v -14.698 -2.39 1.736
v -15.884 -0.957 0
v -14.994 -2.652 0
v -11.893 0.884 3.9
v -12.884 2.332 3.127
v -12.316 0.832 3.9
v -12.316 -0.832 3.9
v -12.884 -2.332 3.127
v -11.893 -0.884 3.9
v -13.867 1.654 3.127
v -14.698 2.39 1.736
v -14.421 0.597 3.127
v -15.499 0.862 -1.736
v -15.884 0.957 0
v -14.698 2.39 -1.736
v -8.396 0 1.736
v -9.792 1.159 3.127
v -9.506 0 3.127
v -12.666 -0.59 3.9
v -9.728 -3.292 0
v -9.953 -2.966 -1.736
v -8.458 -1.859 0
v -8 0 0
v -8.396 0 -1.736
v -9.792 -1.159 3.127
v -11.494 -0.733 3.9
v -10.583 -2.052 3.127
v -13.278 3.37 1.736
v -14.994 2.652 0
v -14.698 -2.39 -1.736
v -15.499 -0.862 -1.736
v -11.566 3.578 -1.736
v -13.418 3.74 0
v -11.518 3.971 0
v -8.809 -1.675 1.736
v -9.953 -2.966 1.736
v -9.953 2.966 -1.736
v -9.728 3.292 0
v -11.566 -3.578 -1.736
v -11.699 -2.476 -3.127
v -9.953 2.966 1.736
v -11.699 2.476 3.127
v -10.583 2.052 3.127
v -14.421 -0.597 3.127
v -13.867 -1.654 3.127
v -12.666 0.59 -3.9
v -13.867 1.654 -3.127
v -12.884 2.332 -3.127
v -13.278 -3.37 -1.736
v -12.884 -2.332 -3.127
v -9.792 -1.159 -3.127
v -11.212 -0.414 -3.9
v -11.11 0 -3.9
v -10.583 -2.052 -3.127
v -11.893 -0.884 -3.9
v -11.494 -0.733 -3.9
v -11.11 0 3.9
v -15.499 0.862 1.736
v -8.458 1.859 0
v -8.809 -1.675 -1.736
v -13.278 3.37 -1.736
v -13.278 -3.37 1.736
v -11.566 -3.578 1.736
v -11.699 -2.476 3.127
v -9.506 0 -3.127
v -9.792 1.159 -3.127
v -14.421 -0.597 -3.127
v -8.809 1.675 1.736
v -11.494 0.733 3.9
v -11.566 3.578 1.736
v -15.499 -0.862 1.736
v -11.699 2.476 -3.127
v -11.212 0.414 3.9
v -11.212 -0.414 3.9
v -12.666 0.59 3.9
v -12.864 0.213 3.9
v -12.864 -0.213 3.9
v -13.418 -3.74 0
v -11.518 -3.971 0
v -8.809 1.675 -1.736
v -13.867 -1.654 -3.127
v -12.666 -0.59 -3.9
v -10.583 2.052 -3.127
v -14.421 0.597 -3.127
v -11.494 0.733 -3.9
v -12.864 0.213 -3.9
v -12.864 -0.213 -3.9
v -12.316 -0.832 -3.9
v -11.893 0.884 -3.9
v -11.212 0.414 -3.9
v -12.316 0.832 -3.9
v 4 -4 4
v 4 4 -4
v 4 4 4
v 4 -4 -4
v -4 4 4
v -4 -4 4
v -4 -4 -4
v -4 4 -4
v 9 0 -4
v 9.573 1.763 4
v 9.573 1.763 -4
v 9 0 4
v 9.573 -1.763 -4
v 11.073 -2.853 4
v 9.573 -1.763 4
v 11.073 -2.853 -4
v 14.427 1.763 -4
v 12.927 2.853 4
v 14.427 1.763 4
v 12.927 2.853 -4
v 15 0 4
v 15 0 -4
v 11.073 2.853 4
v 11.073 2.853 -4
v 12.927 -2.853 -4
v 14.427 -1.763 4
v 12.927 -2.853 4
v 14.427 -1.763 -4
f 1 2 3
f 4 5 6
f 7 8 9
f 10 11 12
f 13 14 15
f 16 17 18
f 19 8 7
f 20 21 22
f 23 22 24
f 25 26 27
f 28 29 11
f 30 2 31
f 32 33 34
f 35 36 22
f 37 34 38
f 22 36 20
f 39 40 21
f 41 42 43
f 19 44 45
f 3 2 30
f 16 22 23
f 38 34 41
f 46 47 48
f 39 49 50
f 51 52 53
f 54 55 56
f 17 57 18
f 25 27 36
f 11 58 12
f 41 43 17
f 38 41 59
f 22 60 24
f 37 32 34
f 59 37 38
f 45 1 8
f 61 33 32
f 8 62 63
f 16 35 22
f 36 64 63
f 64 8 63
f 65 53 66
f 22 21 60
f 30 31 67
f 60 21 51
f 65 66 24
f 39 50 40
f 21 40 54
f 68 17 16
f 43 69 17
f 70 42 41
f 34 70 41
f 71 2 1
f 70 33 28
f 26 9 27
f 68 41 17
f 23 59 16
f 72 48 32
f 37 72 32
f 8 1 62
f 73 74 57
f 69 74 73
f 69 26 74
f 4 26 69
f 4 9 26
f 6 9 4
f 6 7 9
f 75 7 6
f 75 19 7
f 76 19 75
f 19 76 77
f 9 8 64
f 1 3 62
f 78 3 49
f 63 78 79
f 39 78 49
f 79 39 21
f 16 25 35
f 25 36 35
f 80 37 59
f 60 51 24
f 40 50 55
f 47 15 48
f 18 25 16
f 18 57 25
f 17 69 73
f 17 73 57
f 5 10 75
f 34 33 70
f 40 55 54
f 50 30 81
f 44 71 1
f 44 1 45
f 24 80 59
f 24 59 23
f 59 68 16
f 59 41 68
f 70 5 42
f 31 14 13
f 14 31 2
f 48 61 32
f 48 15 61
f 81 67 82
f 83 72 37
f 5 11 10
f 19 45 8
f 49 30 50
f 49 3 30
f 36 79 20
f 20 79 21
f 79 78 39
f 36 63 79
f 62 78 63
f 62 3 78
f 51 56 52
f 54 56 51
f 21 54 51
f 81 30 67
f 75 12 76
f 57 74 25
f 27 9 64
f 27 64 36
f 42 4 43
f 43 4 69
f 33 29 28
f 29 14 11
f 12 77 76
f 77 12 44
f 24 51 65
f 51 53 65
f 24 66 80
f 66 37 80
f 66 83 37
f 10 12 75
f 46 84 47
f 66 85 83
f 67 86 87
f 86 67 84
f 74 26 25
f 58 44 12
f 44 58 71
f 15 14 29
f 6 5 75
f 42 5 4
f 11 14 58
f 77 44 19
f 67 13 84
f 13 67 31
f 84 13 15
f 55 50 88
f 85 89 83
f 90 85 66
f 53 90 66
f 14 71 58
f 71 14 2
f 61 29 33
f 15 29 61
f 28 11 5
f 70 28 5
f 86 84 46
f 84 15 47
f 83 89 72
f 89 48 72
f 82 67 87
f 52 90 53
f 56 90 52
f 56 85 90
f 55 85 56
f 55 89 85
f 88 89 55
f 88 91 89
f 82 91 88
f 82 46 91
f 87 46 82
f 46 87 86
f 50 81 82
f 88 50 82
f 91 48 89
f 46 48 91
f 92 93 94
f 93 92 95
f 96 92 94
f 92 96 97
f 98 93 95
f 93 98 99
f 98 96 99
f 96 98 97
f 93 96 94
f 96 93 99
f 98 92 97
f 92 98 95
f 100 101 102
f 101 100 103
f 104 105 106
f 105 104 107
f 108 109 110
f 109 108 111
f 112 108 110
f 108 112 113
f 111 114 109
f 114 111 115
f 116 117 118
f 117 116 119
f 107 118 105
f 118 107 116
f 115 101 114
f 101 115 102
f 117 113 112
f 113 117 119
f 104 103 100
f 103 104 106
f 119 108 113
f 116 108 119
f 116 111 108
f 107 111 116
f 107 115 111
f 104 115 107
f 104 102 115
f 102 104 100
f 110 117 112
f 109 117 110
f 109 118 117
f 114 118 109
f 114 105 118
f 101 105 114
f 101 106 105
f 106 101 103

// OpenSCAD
color([1, 0.2, 0.2]) translate([-12, 0, 0]) sphere(r=4);
color([0.2, 1, 0.1]) cube([8, 8, 8], center=true);
color([0.2, 0.4,1]) translate([12, 0, 0]) cylinder(h=8, r=3, center=true);
